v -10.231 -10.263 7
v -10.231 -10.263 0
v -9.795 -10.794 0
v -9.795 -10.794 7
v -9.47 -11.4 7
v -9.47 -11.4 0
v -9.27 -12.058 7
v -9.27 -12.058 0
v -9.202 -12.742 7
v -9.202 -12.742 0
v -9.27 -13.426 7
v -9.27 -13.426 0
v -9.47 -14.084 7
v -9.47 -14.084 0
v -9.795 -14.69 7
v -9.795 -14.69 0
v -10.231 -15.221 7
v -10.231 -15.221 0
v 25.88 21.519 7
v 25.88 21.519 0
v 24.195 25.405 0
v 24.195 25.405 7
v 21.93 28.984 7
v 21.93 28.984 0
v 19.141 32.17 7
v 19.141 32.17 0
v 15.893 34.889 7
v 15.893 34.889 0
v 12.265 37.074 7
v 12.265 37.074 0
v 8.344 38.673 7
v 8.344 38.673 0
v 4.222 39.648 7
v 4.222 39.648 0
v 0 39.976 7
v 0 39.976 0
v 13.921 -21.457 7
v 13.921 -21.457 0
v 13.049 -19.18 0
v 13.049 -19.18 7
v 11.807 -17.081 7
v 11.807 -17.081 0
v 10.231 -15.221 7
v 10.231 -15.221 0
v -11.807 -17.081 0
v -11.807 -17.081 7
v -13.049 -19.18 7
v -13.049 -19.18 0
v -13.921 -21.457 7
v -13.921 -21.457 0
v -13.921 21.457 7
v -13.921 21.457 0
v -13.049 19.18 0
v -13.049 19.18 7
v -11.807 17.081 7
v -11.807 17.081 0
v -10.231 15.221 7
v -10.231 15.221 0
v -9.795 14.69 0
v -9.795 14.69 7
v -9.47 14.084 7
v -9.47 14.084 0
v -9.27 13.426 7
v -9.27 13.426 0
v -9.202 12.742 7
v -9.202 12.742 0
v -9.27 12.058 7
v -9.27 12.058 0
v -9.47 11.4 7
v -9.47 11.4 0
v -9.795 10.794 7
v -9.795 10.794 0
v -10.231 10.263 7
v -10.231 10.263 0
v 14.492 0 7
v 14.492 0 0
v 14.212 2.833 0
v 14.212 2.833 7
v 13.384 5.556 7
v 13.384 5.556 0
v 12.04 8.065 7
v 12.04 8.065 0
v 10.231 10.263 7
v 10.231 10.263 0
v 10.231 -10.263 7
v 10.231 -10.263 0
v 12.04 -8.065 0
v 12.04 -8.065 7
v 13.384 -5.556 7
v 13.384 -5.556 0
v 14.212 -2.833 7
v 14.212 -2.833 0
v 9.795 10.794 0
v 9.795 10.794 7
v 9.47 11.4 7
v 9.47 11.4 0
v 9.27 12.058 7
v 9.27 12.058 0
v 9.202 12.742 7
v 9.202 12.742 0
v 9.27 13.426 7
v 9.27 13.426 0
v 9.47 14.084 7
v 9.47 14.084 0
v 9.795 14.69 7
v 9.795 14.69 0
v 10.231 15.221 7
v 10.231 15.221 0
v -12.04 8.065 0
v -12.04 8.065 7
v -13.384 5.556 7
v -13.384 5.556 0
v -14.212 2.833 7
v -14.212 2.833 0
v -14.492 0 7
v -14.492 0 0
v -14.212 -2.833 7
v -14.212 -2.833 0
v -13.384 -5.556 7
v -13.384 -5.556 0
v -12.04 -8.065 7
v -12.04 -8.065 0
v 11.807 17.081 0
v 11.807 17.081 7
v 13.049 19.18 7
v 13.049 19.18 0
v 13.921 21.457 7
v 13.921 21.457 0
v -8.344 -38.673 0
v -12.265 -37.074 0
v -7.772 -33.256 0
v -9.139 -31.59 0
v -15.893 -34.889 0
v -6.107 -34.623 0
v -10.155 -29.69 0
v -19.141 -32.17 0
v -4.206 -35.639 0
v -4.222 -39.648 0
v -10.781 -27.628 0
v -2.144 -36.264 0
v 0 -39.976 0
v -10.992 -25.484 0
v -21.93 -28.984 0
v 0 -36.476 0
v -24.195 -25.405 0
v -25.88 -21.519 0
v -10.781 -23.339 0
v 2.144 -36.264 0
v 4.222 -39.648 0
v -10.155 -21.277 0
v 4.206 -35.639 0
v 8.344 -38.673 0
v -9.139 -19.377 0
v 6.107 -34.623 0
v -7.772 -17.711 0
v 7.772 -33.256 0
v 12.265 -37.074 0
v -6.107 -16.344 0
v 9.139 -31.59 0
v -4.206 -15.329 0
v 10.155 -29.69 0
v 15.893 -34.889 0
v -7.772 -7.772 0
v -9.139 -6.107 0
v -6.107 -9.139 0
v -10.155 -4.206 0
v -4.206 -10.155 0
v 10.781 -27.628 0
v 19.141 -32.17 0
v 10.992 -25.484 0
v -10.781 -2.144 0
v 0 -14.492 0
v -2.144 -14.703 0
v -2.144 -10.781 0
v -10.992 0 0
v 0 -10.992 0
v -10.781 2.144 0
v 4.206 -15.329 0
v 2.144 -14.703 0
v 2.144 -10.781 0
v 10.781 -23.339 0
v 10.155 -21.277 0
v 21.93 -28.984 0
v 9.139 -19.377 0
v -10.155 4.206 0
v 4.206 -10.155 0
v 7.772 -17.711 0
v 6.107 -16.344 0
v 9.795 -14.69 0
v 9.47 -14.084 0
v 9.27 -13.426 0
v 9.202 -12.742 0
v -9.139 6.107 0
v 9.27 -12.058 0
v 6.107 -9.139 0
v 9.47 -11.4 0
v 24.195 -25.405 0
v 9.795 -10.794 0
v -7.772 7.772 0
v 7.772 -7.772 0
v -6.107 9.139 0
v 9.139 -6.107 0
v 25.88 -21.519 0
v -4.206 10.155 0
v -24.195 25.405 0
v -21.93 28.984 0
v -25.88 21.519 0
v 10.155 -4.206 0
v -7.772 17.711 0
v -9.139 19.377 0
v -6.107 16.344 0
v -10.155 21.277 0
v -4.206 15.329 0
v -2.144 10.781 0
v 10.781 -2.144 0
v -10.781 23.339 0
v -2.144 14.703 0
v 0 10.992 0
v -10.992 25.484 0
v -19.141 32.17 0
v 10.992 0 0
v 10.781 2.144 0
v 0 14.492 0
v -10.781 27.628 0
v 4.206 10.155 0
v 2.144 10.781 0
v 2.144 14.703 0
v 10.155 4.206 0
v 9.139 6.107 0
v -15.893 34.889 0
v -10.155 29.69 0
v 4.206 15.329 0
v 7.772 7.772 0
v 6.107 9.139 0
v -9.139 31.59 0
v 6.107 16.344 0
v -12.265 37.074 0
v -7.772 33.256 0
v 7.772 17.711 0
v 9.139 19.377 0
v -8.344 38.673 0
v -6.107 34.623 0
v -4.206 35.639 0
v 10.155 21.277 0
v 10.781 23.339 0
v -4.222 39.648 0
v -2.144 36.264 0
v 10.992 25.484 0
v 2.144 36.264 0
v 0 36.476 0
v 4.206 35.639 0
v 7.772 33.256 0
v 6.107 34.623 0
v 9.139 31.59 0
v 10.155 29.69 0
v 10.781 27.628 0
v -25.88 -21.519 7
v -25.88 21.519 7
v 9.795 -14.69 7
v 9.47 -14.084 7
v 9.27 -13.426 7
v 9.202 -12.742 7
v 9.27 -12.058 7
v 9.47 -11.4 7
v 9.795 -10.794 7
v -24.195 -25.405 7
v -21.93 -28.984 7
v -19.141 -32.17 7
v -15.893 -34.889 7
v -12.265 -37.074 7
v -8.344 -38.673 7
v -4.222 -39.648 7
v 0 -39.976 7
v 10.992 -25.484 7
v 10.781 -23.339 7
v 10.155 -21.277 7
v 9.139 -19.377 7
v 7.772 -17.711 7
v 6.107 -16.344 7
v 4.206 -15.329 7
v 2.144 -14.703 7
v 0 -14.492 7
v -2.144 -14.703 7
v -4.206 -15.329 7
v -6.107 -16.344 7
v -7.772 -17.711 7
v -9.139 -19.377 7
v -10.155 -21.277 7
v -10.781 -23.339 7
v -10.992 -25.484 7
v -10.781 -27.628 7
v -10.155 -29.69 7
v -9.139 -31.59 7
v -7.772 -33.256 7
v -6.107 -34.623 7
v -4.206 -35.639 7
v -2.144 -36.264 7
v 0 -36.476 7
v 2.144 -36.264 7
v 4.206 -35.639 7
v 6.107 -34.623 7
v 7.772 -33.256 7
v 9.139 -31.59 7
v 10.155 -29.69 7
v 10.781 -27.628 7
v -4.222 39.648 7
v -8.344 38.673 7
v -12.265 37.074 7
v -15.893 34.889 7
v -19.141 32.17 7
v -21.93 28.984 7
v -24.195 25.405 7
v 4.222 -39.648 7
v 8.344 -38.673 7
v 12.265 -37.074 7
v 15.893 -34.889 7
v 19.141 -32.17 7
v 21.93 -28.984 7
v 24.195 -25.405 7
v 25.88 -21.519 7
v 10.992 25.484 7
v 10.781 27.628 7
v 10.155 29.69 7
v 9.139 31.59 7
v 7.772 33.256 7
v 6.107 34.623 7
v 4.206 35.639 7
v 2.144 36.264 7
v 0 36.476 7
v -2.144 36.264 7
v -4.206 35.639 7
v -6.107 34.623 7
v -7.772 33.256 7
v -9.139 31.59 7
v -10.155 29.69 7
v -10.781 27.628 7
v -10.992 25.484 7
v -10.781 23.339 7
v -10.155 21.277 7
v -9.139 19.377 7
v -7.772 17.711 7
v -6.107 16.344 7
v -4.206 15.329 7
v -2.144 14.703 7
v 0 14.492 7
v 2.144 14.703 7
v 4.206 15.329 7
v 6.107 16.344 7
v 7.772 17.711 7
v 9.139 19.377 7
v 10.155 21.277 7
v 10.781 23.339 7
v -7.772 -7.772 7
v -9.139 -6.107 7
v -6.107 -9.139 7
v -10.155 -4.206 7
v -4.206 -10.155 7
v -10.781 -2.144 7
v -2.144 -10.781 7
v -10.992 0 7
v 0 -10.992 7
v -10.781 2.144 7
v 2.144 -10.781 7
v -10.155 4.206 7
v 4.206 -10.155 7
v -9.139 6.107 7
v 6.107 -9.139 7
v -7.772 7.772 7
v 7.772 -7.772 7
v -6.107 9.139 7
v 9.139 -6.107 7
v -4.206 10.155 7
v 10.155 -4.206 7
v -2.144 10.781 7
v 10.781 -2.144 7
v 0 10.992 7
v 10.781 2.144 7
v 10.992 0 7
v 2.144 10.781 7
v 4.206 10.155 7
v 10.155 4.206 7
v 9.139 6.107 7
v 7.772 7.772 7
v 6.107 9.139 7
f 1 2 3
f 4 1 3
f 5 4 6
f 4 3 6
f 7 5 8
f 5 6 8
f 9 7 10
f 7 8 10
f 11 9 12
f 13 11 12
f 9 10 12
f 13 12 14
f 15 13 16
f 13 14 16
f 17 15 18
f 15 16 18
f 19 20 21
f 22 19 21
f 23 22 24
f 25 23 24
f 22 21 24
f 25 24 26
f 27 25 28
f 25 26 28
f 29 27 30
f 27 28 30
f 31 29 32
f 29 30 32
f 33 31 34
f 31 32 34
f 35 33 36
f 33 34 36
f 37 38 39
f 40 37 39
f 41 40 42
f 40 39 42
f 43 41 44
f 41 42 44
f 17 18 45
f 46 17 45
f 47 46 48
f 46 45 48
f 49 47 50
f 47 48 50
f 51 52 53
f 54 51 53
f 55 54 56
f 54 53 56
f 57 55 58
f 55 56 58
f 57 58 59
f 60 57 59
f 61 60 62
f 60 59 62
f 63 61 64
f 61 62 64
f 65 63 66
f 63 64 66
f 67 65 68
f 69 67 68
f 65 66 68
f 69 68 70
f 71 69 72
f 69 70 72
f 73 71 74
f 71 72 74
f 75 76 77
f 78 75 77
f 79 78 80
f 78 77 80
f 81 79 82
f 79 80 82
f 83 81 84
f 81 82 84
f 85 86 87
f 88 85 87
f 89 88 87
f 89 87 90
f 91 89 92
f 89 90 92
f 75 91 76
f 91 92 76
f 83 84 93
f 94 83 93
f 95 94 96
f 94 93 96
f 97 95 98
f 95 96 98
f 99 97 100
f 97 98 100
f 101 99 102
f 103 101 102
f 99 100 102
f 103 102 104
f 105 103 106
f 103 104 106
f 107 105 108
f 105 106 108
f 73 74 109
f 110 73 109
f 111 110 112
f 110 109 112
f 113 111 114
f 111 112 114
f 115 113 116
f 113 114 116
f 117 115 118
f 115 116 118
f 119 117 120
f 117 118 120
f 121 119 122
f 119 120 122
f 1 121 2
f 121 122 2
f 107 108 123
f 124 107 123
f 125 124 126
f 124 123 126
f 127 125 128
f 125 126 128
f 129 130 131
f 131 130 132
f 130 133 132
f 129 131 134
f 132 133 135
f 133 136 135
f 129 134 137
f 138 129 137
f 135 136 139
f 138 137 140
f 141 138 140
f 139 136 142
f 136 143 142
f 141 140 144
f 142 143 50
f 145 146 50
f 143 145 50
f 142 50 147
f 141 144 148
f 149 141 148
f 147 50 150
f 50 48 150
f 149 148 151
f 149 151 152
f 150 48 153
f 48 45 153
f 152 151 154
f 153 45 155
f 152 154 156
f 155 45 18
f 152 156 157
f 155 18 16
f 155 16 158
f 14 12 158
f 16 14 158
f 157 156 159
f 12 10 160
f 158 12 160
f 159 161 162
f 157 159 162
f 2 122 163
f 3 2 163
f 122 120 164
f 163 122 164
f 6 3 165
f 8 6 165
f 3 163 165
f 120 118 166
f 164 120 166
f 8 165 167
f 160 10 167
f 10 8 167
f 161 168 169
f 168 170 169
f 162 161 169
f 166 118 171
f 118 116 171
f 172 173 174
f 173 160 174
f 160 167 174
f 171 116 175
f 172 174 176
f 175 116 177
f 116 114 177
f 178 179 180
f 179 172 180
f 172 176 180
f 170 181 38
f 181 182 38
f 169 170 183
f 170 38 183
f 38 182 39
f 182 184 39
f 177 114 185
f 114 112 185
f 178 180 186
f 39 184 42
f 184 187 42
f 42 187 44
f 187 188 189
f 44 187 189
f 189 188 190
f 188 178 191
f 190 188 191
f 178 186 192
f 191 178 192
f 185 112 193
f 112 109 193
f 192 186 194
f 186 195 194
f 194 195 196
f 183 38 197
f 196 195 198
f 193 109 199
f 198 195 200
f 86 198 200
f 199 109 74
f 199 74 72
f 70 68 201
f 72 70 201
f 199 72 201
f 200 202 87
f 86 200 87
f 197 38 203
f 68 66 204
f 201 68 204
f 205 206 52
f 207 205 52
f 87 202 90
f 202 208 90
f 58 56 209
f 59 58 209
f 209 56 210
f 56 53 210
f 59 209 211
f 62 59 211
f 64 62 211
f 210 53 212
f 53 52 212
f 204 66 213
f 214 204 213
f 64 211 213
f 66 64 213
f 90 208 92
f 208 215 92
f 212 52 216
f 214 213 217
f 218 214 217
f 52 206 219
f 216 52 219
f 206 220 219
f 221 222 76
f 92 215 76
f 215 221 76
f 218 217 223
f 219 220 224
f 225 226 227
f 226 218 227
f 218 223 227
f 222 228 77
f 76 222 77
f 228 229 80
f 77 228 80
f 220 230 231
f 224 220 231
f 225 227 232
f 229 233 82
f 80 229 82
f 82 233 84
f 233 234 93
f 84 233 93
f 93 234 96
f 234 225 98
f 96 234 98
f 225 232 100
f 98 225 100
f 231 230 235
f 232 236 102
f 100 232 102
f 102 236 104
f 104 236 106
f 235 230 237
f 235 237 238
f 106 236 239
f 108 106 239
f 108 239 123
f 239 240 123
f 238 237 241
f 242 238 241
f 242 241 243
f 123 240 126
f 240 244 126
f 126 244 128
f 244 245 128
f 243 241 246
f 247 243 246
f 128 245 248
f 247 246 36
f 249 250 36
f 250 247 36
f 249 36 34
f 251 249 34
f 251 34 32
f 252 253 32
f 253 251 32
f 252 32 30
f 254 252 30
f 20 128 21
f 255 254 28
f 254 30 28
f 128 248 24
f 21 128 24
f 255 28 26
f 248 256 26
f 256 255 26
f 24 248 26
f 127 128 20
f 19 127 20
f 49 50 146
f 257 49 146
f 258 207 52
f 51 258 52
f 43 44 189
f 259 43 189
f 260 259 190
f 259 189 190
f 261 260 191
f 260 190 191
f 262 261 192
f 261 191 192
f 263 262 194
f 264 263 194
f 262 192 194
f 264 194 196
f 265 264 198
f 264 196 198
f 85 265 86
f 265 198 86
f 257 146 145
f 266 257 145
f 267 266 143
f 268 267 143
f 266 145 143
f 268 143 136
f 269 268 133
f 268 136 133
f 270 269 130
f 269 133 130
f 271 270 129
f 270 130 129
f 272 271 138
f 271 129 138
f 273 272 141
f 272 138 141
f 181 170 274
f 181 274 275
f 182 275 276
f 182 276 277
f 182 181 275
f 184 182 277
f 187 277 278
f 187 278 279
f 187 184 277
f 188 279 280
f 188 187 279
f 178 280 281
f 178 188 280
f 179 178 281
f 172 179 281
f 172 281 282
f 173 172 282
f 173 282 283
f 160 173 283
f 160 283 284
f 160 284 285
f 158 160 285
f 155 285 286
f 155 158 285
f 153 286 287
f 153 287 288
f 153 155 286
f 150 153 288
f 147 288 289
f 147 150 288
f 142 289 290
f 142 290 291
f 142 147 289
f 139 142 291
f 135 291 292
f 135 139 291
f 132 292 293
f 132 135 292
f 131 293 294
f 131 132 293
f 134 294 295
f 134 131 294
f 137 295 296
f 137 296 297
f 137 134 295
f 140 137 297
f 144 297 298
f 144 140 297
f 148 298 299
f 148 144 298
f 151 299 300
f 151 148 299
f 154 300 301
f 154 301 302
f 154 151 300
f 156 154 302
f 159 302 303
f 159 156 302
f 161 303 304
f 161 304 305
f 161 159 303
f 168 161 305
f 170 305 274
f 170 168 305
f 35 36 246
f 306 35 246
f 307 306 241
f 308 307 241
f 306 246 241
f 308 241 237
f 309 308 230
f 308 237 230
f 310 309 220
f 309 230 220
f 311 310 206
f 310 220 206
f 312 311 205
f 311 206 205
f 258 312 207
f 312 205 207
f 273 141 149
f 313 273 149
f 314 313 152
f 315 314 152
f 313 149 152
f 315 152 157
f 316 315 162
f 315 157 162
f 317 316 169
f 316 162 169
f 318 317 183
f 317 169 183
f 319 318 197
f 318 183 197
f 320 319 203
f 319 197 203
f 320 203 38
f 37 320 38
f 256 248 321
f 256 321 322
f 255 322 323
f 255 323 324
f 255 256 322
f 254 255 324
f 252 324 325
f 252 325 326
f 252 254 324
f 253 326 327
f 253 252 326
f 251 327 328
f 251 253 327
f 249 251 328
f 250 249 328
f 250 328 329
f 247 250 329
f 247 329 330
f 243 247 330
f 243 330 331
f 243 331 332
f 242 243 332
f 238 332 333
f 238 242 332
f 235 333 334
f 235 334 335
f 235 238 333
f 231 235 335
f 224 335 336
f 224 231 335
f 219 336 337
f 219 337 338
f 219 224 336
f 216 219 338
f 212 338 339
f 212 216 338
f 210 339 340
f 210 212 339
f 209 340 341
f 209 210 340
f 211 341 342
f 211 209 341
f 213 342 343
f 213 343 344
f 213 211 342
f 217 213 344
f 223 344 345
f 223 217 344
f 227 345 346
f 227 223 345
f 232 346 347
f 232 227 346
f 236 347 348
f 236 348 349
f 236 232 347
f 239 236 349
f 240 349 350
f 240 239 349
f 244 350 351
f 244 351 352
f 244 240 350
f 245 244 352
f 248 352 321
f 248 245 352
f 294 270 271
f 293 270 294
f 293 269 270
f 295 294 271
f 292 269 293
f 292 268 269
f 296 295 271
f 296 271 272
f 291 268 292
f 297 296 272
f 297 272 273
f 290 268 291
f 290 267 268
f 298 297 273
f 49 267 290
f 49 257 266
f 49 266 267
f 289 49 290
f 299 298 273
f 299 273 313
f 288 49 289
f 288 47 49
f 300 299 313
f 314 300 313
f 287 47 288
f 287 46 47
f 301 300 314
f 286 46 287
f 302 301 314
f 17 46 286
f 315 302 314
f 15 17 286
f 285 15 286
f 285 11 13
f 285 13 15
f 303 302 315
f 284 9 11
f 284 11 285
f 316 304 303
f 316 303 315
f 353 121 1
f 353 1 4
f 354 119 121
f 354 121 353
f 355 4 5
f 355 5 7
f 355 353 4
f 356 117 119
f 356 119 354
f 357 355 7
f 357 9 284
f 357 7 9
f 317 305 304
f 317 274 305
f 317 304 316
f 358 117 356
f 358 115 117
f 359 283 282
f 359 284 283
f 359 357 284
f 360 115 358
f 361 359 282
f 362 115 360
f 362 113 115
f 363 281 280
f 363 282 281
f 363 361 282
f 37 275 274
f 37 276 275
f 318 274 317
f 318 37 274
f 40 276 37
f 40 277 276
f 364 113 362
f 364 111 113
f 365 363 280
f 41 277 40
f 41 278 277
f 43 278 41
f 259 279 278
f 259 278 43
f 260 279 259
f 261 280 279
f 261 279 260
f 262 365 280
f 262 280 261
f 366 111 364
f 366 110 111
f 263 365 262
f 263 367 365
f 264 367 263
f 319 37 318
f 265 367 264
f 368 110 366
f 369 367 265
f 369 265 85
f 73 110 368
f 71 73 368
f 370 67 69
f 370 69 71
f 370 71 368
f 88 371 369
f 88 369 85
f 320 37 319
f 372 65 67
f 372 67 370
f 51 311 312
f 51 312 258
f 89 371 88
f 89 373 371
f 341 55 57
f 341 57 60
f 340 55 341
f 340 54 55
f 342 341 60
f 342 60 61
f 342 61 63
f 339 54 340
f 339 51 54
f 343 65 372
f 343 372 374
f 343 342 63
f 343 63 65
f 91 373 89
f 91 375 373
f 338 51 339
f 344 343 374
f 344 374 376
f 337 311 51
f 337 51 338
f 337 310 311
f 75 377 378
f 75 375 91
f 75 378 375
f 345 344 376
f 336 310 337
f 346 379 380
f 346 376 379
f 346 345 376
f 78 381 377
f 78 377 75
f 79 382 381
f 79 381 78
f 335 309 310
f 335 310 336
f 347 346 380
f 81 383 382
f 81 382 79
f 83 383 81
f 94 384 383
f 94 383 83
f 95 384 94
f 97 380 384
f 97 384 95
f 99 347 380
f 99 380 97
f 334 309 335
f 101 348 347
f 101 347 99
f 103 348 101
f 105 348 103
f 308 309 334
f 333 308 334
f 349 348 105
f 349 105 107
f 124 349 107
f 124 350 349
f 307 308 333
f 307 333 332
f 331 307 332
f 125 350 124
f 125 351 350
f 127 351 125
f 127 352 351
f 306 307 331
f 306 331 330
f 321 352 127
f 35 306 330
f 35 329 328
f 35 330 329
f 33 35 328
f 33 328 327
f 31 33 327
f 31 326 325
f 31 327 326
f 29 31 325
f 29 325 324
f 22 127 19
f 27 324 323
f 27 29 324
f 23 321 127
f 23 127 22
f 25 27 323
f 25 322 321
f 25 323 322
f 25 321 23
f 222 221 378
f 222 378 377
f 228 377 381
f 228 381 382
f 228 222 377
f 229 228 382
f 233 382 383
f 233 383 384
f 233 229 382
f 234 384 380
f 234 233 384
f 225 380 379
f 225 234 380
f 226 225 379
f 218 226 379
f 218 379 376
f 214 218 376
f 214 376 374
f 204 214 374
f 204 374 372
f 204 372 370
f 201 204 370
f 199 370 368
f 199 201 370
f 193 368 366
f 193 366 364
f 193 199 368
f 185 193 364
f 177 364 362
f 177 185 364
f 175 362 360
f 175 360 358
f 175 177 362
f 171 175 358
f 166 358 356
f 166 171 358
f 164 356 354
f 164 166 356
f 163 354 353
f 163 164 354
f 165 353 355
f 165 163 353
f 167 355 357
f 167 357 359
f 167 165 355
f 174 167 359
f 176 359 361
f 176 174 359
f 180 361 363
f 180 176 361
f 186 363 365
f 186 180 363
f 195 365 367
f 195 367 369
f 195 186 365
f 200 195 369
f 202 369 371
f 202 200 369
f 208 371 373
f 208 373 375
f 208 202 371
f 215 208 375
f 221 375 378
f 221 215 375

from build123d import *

# Parameters (mm, degrees)
F1_R     = 10.99185
F2_DEPTH = 7


with BuildPart() as f2:
    # F1 (on Top) → F2 (new body)
    with BuildSketch(Plane.XY):
        Circle(F1_R)
        with BuildLine():
            ThreePointArc((10.2314, -10.263146), (13.384424, -5.556159), (14.49185, 0))
            ThreePointArc((14.49185, 0), (13.384424, 5.556159), (10.2314, 10.263146))
            ThreePointArc((10.2314, 10.263146), (9.202438, 12.74185), (10.2314, 15.220554))
            ThreePointArc((10.2314, 15.220554), (12.472478, 18.104607), (13.921297, 21.457384))
            ThreePointArc((13.921297, 21.457384), (11.583663, 34.191885), (0, 39.97555))
            ThreePointArc((0, 39.97555), (-11.583663, 34.191885), (-13.921297, 21.457384))
            ThreePointArc((-13.921297, 21.457384), (-12.472478, 18.104607), (-10.2314, 15.220554))
            ThreePointArc((-10.2314, 15.220554), (-9.202438, 12.74185), (-10.2314, 10.263146))
            ThreePointArc((-10.2314, 10.263146), (-14.49185, 0), (-10.2314, -10.263146))
            ThreePointArc((-10.2314, -10.263146), (-9.202438, -12.74185), (-10.2314, -15.220554))
            ThreePointArc((-10.2314, -15.220554), (-12.472478, -18.104607), (-13.921297, -21.457384))
            ThreePointArc((-13.921297, -21.457384), (-11.583663, -34.191885), (0, -39.97555))
            ThreePointArc((0, -39.97555), (11.583663, -34.191885), (13.921297, -21.457384))
            ThreePointArc((13.921297, -21.457384), (12.472478, -18.104607), (10.2314, -15.220554))
            ThreePointArc((10.2314, -15.220554), (9.202438, -12.74185), (10.2314, -10.263146))
        make_face()
        with Locations((0, -25.4837)):
            Circle(F1_R, mode=Mode.SUBTRACT)
        Circle(F1_R, mode=Mode.SUBTRACT)
        with Locations((0, 25.4837)):
            Circle(F1_R, mode=Mode.SUBTRACT)
        with BuildLine():
            Line((25.880013, -21.519277), (13.921297, -21.457384))
            ThreePointArc((13.921297, -21.457384), (11.583663, -34.191885), (0, -39.97555))
            ThreePointArc((0, -39.97555), (15.893466, -34.888855), (25.880013, -21.519277))
        make_face()
        with BuildLine():
            ThreePointArc((0, 39.97555), (11.583663, 34.191885), (13.921297, 21.457384))
            Line((13.921297, 21.457384), (25.880013, 21.519277))
            ThreePointArc((25.880013, 21.519277), (15.893466, 34.888855), (0, 39.97555))
        make_face()
        with BuildLine():
            ThreePointArc((-25.880013, -21.519277), (-15.893466, -34.888855), (0, -39.97555))
            ThreePointArc((0, -39.97555), (-11.583663, -34.191885), (-13.921297, -21.457384))
            Line((-13.921297, -21.457384), (-25.880013, -21.519277))
        make_face()
        with BuildLine():
            ThreePointArc((-13.921297, 21.457384), (-11.583663, 34.191885), (0, 39.97555))
            ThreePointArc((0, 39.97555), (-15.893466, 34.888855), (-25.880013, 21.519277))
            Line((-25.880013, 21.519277), (-13.921297, 21.457384))
        make_face()
    extrude(amount=F2_DEPTH)


solid = f2.part
